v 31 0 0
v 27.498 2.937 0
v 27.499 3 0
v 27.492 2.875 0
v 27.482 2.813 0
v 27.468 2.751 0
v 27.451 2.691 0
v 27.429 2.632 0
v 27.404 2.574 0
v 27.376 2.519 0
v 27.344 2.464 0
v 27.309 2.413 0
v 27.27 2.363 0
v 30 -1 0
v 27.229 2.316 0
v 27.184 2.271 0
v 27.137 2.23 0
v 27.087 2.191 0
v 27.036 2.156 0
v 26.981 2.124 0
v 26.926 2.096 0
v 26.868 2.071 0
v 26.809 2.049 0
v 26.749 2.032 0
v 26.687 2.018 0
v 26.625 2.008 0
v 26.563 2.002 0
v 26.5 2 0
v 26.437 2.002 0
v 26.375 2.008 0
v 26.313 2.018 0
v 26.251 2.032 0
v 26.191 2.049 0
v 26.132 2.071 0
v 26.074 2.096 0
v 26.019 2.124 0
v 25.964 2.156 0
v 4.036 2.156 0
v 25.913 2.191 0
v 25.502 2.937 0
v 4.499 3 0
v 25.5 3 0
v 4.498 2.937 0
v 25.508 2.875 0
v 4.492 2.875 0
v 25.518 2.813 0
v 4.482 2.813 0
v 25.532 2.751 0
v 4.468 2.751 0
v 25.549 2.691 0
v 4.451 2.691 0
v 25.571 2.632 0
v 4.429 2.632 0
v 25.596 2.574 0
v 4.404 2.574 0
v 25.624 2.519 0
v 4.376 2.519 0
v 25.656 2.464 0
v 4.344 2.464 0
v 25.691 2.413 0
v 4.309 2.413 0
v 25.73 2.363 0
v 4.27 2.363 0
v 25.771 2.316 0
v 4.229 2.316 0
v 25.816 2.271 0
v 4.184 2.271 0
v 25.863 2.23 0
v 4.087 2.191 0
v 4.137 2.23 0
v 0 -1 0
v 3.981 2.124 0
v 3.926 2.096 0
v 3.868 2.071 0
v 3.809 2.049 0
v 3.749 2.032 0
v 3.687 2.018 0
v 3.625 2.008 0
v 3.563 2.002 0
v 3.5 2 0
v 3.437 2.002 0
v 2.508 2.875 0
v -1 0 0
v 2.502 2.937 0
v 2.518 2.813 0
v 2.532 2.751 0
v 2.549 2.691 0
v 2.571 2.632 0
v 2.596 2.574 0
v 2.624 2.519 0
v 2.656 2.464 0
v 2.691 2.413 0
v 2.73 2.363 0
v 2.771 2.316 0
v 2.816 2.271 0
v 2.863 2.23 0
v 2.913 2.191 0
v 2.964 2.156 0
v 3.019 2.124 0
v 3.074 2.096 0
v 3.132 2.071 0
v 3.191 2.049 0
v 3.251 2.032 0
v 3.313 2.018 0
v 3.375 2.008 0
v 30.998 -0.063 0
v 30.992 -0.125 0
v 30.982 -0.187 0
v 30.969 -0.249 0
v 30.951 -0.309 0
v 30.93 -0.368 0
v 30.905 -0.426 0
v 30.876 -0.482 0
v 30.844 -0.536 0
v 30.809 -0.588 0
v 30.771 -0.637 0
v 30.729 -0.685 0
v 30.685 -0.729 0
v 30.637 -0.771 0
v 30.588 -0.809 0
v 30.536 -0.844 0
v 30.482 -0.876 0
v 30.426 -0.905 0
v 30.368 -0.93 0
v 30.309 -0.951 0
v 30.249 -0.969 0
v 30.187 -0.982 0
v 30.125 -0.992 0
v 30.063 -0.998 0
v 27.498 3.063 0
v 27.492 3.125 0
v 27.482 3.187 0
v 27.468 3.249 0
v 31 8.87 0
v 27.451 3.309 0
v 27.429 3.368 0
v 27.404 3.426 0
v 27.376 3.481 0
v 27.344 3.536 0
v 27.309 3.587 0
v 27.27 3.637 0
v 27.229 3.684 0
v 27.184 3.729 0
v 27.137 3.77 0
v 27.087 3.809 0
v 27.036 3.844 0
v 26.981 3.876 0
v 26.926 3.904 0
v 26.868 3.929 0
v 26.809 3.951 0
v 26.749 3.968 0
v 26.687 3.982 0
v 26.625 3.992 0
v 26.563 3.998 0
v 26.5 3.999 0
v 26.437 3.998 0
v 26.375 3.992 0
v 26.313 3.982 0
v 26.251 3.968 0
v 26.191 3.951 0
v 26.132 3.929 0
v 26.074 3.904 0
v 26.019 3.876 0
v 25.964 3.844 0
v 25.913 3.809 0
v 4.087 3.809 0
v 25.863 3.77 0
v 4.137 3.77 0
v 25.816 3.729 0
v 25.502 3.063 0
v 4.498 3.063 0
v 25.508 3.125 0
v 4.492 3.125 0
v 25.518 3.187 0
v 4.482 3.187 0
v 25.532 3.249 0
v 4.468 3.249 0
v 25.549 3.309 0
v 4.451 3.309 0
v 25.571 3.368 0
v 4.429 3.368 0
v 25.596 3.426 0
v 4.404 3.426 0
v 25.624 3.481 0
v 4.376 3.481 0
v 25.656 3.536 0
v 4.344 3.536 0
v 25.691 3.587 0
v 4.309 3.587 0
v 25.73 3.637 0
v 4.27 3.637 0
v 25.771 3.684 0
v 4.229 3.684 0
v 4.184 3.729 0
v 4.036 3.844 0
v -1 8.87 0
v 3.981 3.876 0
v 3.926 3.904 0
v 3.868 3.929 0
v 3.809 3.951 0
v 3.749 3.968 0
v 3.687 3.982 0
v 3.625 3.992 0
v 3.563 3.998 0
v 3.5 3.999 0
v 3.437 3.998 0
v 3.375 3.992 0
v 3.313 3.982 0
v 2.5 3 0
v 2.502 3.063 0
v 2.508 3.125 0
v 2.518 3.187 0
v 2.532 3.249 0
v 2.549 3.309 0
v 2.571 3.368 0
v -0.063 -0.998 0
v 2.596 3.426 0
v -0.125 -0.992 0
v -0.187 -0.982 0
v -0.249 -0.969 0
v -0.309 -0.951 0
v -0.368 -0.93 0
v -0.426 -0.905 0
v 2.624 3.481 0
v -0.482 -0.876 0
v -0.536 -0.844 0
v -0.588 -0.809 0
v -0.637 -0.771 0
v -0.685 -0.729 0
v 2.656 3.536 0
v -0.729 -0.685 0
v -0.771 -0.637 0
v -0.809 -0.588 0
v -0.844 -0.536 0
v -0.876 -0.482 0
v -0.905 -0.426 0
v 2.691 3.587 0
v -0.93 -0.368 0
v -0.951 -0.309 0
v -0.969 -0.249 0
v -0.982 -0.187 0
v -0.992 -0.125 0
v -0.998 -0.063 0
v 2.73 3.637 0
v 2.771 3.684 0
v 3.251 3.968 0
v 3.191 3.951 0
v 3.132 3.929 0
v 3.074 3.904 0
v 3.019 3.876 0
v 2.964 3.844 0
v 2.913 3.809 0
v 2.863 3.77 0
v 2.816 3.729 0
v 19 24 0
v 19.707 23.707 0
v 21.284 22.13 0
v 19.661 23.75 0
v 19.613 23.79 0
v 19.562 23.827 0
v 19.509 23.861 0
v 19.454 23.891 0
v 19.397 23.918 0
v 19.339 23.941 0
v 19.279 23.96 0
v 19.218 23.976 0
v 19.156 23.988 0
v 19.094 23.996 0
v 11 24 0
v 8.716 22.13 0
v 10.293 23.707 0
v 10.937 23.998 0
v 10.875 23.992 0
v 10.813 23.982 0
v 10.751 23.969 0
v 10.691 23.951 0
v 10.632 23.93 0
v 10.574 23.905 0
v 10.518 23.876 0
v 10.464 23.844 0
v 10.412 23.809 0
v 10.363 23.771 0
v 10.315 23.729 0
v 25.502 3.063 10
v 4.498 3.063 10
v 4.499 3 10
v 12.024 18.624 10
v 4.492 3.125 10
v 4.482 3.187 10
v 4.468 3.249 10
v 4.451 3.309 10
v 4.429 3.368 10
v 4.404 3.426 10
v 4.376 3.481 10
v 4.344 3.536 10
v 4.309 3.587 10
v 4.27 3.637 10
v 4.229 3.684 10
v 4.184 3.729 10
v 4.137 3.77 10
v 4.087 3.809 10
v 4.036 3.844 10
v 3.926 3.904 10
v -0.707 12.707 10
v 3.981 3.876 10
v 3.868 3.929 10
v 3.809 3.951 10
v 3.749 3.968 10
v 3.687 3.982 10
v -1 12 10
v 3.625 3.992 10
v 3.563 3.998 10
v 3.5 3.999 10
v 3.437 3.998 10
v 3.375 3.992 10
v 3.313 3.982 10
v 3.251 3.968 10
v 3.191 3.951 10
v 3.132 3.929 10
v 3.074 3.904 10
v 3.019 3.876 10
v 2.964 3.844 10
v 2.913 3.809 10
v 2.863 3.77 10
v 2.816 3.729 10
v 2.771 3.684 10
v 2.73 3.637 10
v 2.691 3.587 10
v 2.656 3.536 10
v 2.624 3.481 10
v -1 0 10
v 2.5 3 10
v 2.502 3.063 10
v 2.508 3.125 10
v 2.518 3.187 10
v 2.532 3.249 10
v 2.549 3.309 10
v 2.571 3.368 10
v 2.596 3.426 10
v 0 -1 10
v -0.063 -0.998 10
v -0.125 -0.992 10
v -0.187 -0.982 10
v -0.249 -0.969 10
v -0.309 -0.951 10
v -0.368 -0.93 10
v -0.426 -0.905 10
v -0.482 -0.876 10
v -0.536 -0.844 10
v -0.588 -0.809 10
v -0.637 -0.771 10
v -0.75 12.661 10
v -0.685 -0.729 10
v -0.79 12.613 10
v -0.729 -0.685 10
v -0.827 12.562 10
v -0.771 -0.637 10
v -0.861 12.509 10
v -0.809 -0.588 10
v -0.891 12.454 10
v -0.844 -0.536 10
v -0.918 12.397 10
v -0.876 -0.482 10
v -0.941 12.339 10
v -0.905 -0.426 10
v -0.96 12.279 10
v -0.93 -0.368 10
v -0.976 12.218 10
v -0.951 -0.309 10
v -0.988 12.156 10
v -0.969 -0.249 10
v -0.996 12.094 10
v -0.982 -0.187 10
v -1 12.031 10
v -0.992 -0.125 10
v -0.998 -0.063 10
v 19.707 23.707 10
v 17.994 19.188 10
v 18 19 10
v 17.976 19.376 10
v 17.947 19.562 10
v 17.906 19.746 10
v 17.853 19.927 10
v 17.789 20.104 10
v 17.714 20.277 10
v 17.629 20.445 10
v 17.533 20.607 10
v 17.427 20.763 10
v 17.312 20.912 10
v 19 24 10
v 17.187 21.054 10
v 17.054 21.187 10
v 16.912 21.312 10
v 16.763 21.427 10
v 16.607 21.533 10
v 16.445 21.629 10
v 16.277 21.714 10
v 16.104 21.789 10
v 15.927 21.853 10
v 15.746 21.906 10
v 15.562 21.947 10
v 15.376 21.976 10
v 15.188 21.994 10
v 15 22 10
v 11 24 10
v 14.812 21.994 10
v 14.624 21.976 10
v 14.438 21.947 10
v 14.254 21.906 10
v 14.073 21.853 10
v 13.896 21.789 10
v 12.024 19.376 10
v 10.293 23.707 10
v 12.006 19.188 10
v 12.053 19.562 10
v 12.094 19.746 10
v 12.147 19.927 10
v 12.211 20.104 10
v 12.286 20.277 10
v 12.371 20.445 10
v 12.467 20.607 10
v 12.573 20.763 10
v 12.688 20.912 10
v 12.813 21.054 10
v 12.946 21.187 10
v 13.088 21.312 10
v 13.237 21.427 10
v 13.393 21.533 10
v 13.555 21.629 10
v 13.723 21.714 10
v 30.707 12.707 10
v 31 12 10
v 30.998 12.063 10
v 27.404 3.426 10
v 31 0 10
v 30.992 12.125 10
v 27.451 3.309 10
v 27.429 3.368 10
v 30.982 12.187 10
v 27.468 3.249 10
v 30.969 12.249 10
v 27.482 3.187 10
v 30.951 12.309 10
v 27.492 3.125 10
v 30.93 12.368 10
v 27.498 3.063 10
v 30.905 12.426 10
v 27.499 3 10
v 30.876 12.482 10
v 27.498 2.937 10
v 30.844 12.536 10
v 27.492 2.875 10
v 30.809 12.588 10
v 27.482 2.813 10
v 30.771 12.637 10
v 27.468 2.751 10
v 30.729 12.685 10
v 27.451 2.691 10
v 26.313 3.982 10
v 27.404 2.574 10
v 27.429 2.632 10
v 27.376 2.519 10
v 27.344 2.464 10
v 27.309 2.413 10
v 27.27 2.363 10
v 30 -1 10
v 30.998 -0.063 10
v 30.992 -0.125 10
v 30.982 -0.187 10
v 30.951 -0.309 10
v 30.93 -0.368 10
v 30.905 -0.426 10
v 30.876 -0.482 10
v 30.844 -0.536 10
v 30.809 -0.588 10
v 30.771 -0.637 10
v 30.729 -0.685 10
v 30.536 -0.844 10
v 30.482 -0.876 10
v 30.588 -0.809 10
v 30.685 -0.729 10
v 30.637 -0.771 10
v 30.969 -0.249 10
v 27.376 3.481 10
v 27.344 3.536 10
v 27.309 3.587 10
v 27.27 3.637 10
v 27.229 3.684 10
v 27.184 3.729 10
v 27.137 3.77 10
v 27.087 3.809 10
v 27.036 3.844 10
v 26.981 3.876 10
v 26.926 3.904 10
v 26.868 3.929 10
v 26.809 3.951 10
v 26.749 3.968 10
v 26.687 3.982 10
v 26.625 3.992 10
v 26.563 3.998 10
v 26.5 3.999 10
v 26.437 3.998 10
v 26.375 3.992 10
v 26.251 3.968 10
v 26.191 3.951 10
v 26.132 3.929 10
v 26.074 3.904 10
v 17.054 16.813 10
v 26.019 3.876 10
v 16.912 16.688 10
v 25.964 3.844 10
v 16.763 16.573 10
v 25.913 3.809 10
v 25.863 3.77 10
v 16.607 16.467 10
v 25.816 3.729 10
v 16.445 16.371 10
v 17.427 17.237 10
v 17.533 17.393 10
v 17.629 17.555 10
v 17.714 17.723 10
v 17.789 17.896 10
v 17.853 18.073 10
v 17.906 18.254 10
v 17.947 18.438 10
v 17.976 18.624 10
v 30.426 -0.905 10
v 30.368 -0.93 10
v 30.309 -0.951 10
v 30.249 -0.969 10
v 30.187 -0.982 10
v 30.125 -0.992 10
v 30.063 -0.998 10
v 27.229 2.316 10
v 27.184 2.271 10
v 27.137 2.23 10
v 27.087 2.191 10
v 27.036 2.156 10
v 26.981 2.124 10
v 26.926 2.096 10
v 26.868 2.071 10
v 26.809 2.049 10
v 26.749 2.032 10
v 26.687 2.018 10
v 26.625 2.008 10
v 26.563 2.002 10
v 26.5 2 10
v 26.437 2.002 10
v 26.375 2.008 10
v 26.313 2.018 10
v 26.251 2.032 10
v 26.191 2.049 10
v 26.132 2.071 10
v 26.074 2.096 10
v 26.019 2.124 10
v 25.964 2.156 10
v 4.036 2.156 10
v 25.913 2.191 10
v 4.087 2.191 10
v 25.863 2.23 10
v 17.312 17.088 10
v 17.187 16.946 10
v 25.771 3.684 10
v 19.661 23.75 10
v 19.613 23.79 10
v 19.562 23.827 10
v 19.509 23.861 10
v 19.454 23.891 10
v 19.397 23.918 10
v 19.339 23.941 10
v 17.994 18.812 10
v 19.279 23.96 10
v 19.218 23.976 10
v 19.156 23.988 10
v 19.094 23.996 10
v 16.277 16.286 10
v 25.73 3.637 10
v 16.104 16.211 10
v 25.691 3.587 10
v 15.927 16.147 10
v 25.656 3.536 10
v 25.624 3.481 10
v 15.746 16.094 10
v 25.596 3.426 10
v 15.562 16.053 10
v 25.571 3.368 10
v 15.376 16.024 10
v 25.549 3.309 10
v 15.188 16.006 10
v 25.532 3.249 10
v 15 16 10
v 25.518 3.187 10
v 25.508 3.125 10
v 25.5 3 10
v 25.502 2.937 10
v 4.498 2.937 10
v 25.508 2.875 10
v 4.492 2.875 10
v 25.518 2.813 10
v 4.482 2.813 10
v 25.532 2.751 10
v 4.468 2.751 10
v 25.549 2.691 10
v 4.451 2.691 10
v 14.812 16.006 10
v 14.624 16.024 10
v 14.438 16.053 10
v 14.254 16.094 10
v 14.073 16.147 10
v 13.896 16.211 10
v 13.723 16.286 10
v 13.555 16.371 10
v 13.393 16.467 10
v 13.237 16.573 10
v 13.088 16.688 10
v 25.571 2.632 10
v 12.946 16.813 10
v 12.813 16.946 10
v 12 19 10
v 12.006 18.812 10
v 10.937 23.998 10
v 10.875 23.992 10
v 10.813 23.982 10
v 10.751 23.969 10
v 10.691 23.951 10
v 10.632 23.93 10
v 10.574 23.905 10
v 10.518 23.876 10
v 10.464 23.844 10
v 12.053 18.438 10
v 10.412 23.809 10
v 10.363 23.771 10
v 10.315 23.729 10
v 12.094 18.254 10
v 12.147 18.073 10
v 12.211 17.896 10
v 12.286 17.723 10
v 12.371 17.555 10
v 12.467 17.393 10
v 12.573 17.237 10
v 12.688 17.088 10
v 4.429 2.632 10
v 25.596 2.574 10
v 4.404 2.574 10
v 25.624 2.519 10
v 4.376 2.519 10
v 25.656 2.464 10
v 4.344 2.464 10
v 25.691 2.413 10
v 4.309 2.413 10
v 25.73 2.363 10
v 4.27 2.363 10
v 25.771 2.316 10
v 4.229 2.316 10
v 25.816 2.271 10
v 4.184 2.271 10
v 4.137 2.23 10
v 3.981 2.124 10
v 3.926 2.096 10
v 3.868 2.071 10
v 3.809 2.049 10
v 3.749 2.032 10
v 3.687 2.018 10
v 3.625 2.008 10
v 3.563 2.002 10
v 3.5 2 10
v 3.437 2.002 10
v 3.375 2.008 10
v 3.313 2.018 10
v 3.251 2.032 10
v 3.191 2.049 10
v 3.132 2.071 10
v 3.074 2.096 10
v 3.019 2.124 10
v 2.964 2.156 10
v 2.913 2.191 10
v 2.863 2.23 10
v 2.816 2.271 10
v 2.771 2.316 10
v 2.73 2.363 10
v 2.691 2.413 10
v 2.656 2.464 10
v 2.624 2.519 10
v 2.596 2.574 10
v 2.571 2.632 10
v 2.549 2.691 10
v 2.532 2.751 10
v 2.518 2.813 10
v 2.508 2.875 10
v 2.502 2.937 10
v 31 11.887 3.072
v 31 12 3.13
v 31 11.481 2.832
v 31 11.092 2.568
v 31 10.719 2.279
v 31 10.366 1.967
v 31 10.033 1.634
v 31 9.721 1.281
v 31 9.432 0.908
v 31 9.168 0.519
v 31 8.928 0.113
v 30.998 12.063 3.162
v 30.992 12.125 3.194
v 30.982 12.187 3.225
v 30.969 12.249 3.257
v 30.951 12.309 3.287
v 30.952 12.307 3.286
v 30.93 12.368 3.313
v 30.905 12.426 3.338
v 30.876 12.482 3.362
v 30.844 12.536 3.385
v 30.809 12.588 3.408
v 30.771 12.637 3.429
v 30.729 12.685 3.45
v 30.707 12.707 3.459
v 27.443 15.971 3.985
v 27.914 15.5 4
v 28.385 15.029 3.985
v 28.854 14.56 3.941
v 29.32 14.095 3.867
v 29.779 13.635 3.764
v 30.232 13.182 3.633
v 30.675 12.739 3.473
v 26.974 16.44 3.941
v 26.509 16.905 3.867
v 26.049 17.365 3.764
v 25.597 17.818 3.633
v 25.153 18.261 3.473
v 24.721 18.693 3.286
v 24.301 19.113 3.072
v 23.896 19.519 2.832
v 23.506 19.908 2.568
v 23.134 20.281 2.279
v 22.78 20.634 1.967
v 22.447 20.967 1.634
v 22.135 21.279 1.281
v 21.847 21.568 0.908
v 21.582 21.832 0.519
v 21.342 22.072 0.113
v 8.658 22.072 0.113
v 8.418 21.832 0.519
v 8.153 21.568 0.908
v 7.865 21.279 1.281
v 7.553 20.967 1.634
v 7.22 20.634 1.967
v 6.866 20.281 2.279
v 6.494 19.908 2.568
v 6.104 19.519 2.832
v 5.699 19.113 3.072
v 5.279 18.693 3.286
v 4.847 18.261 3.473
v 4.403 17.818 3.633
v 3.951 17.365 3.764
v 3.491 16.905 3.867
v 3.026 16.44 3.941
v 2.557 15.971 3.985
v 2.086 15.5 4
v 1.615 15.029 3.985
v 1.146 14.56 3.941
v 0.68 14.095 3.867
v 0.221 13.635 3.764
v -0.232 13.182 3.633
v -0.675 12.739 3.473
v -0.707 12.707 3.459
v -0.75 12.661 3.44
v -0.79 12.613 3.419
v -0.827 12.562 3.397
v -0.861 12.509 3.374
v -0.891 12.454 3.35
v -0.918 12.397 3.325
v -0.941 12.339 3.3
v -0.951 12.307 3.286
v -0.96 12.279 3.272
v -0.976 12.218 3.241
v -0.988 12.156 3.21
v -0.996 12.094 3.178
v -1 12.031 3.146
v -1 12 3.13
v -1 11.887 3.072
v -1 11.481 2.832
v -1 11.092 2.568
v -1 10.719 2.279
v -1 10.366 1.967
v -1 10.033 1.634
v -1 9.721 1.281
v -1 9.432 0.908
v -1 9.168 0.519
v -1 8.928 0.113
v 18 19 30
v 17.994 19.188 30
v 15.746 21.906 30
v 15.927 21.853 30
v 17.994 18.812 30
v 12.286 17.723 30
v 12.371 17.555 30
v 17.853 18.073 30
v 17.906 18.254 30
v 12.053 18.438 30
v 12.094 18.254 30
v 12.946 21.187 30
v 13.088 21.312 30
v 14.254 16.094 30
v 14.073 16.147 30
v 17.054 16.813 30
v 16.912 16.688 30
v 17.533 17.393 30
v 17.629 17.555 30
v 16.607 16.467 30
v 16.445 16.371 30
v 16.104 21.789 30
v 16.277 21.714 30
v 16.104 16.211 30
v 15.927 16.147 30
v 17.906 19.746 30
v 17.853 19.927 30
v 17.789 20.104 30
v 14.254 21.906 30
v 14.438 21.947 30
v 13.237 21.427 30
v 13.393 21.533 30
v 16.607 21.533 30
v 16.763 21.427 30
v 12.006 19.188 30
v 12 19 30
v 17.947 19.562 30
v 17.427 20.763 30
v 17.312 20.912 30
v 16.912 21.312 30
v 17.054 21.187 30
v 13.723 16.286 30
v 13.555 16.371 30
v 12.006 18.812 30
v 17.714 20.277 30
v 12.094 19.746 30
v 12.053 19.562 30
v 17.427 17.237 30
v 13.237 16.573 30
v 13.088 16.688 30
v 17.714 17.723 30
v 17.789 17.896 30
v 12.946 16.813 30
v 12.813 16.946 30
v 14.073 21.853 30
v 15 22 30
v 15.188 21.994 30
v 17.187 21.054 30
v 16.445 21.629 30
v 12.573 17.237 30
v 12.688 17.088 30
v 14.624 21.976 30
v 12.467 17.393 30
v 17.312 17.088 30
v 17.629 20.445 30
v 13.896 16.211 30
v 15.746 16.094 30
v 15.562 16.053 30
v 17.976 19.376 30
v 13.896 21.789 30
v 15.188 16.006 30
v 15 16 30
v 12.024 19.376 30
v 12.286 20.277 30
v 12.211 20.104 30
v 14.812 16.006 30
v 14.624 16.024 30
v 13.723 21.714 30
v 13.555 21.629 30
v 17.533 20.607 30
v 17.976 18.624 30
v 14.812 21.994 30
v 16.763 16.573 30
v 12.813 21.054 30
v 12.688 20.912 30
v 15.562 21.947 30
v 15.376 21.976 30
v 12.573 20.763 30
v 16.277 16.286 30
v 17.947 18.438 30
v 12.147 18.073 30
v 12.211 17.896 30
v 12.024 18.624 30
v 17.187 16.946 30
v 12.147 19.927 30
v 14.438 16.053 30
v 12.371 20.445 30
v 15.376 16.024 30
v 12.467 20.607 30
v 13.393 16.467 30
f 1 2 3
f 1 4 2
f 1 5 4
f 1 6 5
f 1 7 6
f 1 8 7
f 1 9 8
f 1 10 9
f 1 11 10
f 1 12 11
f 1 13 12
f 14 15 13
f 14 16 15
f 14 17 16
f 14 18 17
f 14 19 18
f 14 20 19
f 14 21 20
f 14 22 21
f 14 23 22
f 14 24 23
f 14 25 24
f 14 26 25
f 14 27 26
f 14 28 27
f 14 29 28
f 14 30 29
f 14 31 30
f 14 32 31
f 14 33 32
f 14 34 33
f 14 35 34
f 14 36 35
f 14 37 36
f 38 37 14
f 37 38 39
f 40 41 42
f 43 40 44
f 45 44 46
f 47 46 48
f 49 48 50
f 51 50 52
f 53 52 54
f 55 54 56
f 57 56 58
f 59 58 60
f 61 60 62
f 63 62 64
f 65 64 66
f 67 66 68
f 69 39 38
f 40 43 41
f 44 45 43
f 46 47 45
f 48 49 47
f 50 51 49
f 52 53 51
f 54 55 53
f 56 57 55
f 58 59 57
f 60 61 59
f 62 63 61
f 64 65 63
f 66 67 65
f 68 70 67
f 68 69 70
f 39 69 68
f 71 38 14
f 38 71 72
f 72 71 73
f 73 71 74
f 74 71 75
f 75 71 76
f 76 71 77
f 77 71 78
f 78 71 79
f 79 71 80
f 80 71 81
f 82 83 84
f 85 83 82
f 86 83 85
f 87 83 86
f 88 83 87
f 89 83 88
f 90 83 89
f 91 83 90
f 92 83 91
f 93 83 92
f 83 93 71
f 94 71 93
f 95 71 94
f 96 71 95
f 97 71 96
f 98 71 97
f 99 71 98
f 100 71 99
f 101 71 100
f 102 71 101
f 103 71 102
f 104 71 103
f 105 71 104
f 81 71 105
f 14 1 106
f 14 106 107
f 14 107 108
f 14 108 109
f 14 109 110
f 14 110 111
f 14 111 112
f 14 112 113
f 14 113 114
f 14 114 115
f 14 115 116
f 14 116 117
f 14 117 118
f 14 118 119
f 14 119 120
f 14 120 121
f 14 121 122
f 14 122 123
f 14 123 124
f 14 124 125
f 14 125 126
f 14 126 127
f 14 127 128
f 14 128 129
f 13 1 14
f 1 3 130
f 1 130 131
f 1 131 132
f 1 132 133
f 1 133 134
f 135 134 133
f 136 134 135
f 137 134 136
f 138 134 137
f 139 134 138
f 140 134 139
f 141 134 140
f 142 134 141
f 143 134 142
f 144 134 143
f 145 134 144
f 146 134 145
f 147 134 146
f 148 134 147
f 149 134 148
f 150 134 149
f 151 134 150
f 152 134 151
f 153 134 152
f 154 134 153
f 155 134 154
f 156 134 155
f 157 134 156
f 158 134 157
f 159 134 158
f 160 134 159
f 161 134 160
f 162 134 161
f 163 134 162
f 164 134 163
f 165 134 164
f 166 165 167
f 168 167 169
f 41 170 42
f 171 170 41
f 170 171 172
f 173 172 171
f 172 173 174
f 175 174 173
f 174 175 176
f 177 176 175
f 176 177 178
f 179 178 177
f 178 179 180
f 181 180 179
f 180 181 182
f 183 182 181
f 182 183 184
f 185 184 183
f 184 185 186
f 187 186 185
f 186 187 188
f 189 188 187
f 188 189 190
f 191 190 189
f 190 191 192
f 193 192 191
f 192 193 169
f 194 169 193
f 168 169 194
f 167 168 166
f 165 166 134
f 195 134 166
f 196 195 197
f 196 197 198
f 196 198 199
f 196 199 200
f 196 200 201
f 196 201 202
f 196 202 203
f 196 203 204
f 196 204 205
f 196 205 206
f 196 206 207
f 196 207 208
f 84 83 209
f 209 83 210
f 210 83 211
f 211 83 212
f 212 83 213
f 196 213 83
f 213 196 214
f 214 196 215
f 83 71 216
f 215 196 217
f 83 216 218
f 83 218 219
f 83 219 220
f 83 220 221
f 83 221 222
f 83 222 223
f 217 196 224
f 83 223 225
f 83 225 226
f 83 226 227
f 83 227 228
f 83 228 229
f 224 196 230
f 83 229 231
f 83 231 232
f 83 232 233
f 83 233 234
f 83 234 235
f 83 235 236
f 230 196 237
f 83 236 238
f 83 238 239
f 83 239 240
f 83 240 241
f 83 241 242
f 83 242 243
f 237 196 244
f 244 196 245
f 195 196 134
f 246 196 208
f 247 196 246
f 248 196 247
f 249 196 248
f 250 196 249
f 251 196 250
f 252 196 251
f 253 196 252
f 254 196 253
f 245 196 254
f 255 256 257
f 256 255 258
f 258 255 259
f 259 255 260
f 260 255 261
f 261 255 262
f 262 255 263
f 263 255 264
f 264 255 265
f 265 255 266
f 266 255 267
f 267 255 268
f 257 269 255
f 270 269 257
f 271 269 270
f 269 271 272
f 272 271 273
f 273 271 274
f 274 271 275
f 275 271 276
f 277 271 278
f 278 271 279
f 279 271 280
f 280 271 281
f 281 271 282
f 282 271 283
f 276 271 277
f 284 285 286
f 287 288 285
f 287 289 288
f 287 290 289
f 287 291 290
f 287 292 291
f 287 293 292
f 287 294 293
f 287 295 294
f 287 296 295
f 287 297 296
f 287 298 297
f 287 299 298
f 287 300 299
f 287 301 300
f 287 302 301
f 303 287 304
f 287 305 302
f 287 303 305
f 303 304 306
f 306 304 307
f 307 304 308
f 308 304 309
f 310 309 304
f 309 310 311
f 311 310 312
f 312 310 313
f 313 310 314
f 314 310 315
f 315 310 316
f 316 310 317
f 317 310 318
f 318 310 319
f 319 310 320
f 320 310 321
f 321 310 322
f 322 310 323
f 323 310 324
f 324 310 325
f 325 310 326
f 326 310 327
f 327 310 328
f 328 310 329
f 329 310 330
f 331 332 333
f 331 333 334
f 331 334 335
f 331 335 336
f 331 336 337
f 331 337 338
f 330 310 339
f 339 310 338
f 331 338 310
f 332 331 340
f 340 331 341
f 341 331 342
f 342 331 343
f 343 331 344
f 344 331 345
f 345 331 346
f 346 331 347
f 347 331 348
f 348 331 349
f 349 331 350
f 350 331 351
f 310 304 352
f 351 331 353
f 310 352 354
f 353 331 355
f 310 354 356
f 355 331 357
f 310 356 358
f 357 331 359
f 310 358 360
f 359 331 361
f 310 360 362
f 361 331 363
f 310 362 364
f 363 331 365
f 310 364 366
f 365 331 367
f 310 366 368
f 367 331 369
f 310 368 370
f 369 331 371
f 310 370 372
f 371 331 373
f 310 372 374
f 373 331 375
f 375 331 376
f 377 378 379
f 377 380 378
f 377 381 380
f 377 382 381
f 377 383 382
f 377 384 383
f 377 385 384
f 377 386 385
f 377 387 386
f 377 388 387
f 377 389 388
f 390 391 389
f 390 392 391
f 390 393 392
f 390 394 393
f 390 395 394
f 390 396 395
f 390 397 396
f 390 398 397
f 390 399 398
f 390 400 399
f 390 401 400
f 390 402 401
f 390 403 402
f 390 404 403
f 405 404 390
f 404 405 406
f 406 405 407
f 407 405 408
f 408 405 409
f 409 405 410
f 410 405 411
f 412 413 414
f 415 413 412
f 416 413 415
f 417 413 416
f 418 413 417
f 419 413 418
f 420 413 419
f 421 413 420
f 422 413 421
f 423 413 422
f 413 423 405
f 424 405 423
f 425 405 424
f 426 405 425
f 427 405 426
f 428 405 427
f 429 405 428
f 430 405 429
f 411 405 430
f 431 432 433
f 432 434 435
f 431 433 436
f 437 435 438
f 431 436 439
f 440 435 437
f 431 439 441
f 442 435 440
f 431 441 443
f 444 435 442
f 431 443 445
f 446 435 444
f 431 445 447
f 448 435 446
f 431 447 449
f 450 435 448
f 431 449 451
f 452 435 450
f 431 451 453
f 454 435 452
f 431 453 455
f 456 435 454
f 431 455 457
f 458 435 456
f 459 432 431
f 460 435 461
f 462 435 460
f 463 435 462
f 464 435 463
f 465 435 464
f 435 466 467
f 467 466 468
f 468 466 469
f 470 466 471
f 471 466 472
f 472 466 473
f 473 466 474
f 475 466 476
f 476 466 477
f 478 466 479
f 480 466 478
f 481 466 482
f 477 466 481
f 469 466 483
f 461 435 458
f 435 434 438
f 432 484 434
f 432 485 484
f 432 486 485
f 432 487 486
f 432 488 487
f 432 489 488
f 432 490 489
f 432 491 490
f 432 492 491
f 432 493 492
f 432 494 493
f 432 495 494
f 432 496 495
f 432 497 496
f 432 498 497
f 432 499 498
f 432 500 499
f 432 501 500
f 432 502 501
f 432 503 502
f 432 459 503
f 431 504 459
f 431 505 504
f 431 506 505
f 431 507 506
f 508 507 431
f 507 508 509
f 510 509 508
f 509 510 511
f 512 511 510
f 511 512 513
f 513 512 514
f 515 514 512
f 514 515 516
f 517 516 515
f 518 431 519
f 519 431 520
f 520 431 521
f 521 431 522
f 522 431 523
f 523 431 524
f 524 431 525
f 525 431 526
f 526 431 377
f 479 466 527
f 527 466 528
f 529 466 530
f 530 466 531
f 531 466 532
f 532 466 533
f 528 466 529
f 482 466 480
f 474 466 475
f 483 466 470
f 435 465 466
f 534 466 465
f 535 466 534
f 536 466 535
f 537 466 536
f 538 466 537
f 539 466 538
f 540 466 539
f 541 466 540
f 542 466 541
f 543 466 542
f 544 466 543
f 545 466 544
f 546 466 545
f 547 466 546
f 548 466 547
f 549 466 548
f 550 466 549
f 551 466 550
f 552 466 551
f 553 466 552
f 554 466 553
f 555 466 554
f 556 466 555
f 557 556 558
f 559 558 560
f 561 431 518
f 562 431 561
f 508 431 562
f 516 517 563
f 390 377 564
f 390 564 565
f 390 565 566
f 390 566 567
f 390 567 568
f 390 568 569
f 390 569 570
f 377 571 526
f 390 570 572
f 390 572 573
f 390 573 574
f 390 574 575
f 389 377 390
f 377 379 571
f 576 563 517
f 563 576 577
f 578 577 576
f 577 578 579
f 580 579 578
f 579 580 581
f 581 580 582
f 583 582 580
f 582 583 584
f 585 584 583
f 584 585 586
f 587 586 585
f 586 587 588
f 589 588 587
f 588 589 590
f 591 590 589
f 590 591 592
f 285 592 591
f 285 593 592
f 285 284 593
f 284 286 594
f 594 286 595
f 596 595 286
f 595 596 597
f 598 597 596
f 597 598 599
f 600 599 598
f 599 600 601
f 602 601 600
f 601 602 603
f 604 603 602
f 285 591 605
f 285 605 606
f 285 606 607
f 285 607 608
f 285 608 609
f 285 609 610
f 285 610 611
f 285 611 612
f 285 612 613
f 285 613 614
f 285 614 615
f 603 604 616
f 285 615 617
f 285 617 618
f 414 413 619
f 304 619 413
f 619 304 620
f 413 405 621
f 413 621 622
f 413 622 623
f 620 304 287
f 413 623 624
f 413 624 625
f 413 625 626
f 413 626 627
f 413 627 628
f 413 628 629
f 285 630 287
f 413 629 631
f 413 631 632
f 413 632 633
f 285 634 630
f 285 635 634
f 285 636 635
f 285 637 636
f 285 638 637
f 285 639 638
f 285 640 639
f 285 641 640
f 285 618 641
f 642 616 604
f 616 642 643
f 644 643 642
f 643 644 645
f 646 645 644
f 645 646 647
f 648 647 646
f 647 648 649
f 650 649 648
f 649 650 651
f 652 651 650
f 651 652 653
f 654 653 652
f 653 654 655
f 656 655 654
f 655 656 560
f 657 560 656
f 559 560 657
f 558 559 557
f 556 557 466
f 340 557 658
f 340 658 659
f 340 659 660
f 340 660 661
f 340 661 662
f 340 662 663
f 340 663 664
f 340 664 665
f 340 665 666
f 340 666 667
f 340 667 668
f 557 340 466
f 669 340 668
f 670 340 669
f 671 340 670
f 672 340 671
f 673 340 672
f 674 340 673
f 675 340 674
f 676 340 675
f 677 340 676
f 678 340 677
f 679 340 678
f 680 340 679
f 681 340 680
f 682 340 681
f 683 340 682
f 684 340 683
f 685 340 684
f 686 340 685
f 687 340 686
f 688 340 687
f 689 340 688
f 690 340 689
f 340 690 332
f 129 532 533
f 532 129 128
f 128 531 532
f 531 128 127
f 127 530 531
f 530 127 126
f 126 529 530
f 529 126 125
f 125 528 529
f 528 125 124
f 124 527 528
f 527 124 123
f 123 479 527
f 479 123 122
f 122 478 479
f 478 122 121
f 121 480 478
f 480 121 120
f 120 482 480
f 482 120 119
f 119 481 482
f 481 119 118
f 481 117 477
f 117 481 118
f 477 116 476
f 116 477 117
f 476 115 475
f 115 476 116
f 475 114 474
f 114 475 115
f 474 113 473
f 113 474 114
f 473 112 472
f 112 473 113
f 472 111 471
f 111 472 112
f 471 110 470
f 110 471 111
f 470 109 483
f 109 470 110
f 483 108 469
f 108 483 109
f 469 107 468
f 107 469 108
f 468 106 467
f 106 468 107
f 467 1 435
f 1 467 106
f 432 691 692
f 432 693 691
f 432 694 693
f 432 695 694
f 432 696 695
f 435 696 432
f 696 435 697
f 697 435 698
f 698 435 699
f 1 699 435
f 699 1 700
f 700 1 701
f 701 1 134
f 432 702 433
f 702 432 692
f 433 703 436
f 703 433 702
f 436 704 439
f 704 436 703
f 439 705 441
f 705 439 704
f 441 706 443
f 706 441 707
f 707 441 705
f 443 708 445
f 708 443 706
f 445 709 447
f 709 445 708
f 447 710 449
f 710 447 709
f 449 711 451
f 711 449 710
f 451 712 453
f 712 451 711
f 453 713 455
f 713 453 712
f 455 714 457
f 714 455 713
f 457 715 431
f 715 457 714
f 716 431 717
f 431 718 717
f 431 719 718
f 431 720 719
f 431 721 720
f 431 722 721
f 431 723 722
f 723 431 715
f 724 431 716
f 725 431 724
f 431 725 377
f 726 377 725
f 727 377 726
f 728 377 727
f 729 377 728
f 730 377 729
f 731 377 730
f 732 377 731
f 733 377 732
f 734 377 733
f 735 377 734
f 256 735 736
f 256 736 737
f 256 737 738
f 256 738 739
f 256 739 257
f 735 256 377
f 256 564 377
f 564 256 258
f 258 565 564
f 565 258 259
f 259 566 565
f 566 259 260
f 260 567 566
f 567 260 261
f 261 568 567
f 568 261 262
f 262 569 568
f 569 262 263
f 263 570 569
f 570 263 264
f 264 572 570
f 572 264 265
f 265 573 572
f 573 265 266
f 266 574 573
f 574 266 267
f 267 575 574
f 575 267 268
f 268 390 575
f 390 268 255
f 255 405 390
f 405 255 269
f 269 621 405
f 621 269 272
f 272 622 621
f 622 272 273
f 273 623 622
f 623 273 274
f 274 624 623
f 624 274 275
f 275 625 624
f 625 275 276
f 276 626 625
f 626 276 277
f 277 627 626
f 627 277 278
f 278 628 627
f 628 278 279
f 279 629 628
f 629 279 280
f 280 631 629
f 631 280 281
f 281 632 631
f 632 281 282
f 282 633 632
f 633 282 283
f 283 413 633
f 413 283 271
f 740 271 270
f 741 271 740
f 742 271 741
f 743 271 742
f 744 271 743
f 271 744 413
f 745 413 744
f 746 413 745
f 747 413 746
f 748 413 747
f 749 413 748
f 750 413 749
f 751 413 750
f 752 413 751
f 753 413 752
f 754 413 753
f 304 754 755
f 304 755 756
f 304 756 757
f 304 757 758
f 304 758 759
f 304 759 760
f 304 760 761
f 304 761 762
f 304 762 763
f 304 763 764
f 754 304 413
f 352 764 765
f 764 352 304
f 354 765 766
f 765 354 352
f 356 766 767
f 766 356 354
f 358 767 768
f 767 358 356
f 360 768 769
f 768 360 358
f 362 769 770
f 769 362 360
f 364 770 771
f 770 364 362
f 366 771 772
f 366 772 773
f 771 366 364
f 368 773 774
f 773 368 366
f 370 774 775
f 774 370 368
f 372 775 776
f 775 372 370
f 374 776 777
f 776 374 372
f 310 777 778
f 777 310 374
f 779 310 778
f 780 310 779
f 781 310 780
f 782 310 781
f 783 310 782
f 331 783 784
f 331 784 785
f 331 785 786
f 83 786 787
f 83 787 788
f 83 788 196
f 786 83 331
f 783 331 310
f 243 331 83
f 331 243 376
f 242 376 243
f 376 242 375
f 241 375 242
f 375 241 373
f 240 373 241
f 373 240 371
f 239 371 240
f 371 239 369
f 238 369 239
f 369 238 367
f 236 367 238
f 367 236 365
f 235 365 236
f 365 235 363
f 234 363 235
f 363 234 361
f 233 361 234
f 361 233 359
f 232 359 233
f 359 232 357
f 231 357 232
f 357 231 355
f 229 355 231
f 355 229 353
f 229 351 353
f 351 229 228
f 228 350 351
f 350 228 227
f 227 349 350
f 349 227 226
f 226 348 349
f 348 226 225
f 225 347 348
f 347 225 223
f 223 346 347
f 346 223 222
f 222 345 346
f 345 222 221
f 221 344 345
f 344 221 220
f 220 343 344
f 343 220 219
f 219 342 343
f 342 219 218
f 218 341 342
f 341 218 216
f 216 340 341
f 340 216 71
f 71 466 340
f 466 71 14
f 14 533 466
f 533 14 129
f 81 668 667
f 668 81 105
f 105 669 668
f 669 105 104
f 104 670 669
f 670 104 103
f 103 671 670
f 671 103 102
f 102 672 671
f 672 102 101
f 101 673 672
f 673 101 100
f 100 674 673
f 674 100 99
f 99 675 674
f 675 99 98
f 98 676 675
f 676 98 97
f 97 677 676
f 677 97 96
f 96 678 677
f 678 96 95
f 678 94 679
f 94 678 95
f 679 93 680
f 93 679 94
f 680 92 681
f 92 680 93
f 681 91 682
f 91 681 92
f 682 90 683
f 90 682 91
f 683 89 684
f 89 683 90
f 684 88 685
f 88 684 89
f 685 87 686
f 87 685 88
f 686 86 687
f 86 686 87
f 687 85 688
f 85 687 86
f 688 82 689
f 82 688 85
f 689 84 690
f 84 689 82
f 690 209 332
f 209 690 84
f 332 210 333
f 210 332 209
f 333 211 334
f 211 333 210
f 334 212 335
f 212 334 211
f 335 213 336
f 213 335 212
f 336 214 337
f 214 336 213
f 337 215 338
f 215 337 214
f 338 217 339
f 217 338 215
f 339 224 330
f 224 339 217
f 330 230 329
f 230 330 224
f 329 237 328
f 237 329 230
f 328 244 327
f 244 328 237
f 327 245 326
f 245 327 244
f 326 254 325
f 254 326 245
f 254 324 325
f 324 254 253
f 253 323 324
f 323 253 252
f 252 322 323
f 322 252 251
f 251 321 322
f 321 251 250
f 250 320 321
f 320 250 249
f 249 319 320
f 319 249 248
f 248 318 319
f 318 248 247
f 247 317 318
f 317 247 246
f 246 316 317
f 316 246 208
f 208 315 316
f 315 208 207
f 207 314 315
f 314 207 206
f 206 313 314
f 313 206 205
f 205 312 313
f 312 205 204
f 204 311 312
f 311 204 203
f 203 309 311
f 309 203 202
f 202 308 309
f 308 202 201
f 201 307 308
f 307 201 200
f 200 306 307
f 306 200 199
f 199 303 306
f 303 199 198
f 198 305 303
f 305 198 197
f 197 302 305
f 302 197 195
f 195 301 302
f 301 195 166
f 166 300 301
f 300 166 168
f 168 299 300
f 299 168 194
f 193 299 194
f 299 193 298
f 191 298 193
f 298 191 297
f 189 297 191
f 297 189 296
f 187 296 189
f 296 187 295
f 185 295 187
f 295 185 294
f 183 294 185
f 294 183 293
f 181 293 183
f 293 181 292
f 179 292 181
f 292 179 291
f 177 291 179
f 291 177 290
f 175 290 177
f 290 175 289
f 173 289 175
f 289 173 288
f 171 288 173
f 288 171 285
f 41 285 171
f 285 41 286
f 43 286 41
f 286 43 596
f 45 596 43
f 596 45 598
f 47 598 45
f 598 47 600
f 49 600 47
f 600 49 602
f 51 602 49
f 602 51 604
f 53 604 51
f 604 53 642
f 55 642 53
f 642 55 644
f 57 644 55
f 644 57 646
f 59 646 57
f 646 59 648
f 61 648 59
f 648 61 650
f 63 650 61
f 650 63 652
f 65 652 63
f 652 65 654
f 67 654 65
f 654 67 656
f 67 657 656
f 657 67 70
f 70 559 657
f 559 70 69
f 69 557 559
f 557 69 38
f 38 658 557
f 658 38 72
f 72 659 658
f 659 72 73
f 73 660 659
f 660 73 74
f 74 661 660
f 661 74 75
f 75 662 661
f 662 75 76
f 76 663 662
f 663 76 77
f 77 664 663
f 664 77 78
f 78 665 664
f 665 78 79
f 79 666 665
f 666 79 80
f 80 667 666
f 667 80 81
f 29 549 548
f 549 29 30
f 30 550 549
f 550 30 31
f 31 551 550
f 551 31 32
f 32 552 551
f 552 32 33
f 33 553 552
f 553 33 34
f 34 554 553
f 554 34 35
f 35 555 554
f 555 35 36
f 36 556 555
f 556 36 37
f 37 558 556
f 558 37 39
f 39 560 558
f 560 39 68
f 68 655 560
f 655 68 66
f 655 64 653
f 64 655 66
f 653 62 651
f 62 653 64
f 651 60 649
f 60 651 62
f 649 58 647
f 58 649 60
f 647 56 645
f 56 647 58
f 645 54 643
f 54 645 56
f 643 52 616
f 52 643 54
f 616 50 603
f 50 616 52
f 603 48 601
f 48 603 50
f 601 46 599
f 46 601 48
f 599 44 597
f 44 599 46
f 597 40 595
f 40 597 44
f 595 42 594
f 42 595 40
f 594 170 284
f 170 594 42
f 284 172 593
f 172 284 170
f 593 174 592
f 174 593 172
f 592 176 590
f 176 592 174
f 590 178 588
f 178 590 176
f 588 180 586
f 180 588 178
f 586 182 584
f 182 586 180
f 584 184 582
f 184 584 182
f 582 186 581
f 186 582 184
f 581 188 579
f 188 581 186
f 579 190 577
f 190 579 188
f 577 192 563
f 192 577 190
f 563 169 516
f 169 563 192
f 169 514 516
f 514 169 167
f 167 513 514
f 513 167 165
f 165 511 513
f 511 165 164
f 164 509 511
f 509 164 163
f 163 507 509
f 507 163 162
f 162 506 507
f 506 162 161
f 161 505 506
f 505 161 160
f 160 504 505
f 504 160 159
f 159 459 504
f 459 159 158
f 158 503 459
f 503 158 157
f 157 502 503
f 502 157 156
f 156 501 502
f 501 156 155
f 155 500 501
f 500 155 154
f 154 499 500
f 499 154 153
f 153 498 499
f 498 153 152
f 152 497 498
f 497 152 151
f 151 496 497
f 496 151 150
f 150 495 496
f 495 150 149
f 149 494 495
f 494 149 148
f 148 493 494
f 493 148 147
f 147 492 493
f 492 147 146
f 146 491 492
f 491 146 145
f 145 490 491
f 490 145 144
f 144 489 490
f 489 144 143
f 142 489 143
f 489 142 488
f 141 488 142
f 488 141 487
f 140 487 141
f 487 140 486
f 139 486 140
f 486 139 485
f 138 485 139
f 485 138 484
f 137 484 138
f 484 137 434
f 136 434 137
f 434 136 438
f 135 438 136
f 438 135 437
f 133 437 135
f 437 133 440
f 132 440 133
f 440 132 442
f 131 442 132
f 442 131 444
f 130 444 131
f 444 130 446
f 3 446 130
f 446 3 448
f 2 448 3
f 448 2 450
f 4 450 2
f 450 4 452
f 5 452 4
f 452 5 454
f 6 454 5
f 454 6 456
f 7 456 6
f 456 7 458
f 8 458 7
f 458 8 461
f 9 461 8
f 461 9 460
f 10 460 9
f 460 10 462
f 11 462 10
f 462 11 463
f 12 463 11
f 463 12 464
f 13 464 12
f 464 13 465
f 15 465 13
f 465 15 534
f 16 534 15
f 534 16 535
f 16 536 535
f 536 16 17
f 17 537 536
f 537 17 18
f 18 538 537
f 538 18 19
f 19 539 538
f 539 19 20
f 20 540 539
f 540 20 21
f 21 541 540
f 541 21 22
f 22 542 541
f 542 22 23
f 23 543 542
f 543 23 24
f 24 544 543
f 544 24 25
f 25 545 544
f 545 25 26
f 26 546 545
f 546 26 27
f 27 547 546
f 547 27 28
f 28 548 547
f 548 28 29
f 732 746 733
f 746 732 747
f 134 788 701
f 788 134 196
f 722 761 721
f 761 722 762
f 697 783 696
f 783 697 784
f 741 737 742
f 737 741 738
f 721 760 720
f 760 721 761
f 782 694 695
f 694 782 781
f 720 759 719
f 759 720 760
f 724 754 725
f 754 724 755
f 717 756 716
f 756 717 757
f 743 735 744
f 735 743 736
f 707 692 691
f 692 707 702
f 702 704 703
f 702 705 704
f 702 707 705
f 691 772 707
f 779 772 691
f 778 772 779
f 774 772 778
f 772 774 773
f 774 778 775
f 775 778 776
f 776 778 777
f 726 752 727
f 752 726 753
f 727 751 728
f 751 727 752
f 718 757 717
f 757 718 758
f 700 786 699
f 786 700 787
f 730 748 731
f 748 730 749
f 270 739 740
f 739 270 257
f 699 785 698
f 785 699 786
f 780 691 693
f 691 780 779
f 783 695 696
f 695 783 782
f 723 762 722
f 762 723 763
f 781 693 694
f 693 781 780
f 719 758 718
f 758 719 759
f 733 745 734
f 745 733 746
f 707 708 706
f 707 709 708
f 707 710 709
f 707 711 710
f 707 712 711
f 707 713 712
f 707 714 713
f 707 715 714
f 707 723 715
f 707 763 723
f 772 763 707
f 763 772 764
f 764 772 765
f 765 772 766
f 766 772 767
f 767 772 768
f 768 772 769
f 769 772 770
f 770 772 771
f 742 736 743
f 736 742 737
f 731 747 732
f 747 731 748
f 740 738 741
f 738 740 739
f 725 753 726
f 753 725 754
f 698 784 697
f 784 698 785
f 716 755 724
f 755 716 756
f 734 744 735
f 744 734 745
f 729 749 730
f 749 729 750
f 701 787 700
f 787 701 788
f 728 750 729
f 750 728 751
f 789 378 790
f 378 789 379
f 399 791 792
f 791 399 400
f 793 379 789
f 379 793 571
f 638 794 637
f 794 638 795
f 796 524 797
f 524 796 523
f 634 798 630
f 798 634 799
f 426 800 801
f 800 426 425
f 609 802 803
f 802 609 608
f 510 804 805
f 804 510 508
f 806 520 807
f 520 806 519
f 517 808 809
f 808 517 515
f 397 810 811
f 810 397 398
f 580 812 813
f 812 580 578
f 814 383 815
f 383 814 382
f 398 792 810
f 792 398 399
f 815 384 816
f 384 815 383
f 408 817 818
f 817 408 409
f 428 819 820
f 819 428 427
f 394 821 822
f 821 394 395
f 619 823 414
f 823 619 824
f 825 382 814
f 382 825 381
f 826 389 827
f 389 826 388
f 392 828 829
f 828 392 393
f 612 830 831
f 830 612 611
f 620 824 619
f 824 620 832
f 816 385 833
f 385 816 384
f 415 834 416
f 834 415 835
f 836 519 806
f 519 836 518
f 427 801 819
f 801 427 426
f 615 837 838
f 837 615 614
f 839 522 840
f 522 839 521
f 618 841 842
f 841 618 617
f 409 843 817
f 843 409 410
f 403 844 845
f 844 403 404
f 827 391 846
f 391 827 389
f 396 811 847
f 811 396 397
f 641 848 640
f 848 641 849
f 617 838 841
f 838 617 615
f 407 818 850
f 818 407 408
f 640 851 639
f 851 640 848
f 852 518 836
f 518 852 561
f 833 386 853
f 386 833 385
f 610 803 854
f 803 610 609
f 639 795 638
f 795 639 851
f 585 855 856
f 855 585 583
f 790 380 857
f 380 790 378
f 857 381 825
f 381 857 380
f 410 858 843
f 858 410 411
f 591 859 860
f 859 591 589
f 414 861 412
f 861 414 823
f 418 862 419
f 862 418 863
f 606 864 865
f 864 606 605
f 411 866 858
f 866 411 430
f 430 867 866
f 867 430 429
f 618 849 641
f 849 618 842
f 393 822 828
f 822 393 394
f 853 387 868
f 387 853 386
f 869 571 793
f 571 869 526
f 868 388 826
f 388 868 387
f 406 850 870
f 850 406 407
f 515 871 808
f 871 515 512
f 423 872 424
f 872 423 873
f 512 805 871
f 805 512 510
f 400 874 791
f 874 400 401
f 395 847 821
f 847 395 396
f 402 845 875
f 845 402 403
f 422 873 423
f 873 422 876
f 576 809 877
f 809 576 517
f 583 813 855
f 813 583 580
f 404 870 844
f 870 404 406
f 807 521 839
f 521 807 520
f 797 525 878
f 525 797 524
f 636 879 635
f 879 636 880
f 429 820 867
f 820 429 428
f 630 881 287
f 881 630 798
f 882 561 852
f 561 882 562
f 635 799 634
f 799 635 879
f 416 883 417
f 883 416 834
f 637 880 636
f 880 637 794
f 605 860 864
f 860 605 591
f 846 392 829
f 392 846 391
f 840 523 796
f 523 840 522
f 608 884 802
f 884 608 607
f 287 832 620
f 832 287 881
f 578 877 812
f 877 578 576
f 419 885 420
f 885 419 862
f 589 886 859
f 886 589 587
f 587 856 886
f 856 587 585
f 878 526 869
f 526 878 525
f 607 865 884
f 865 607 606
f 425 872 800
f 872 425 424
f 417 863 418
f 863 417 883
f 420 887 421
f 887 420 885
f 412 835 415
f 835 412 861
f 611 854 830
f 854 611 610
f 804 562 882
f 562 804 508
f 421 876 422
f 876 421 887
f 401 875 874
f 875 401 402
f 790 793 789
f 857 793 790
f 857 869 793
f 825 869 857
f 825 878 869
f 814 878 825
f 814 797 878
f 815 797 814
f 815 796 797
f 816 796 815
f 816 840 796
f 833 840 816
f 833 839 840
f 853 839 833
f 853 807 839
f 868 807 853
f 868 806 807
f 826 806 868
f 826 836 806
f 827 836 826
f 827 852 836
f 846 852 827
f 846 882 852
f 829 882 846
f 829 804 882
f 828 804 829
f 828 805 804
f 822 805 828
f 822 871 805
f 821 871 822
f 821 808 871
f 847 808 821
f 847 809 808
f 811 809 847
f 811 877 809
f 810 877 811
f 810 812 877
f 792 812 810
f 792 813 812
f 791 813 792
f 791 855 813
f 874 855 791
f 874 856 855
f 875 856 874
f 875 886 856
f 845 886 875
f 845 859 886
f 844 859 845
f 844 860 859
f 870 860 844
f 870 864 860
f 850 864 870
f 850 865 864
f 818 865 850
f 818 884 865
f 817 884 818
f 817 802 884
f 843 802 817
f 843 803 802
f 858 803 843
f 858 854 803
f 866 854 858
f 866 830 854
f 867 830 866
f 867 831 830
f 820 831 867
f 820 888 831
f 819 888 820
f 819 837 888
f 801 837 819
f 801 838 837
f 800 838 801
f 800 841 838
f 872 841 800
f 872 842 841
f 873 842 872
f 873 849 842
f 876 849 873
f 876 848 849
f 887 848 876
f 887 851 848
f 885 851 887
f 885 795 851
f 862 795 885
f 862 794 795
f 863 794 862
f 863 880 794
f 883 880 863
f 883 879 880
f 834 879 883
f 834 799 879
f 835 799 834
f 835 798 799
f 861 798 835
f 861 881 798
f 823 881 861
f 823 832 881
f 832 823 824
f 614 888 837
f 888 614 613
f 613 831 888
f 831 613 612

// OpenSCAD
$fn = 100;

union () {
translate ([15,19,10]) cylinder (20,r=3);    
difference () {  
    linear_extrude (10) offset (1) difference () {
        square ([30,23]);
        translate ([0,12]) rotate (45) square (20);
        translate ([30,12]) rotate (45) square (20);
        translate ([3.5,3])circle (d=4);
        translate ([26.5,3])circle (2);
    }
    translate ([-2,15.5,-3.5])rotate ([0,90,0]) cylinder (35,d=15);
    //translate ([0,6,0]) cube ([30,20,4]);
}
}
